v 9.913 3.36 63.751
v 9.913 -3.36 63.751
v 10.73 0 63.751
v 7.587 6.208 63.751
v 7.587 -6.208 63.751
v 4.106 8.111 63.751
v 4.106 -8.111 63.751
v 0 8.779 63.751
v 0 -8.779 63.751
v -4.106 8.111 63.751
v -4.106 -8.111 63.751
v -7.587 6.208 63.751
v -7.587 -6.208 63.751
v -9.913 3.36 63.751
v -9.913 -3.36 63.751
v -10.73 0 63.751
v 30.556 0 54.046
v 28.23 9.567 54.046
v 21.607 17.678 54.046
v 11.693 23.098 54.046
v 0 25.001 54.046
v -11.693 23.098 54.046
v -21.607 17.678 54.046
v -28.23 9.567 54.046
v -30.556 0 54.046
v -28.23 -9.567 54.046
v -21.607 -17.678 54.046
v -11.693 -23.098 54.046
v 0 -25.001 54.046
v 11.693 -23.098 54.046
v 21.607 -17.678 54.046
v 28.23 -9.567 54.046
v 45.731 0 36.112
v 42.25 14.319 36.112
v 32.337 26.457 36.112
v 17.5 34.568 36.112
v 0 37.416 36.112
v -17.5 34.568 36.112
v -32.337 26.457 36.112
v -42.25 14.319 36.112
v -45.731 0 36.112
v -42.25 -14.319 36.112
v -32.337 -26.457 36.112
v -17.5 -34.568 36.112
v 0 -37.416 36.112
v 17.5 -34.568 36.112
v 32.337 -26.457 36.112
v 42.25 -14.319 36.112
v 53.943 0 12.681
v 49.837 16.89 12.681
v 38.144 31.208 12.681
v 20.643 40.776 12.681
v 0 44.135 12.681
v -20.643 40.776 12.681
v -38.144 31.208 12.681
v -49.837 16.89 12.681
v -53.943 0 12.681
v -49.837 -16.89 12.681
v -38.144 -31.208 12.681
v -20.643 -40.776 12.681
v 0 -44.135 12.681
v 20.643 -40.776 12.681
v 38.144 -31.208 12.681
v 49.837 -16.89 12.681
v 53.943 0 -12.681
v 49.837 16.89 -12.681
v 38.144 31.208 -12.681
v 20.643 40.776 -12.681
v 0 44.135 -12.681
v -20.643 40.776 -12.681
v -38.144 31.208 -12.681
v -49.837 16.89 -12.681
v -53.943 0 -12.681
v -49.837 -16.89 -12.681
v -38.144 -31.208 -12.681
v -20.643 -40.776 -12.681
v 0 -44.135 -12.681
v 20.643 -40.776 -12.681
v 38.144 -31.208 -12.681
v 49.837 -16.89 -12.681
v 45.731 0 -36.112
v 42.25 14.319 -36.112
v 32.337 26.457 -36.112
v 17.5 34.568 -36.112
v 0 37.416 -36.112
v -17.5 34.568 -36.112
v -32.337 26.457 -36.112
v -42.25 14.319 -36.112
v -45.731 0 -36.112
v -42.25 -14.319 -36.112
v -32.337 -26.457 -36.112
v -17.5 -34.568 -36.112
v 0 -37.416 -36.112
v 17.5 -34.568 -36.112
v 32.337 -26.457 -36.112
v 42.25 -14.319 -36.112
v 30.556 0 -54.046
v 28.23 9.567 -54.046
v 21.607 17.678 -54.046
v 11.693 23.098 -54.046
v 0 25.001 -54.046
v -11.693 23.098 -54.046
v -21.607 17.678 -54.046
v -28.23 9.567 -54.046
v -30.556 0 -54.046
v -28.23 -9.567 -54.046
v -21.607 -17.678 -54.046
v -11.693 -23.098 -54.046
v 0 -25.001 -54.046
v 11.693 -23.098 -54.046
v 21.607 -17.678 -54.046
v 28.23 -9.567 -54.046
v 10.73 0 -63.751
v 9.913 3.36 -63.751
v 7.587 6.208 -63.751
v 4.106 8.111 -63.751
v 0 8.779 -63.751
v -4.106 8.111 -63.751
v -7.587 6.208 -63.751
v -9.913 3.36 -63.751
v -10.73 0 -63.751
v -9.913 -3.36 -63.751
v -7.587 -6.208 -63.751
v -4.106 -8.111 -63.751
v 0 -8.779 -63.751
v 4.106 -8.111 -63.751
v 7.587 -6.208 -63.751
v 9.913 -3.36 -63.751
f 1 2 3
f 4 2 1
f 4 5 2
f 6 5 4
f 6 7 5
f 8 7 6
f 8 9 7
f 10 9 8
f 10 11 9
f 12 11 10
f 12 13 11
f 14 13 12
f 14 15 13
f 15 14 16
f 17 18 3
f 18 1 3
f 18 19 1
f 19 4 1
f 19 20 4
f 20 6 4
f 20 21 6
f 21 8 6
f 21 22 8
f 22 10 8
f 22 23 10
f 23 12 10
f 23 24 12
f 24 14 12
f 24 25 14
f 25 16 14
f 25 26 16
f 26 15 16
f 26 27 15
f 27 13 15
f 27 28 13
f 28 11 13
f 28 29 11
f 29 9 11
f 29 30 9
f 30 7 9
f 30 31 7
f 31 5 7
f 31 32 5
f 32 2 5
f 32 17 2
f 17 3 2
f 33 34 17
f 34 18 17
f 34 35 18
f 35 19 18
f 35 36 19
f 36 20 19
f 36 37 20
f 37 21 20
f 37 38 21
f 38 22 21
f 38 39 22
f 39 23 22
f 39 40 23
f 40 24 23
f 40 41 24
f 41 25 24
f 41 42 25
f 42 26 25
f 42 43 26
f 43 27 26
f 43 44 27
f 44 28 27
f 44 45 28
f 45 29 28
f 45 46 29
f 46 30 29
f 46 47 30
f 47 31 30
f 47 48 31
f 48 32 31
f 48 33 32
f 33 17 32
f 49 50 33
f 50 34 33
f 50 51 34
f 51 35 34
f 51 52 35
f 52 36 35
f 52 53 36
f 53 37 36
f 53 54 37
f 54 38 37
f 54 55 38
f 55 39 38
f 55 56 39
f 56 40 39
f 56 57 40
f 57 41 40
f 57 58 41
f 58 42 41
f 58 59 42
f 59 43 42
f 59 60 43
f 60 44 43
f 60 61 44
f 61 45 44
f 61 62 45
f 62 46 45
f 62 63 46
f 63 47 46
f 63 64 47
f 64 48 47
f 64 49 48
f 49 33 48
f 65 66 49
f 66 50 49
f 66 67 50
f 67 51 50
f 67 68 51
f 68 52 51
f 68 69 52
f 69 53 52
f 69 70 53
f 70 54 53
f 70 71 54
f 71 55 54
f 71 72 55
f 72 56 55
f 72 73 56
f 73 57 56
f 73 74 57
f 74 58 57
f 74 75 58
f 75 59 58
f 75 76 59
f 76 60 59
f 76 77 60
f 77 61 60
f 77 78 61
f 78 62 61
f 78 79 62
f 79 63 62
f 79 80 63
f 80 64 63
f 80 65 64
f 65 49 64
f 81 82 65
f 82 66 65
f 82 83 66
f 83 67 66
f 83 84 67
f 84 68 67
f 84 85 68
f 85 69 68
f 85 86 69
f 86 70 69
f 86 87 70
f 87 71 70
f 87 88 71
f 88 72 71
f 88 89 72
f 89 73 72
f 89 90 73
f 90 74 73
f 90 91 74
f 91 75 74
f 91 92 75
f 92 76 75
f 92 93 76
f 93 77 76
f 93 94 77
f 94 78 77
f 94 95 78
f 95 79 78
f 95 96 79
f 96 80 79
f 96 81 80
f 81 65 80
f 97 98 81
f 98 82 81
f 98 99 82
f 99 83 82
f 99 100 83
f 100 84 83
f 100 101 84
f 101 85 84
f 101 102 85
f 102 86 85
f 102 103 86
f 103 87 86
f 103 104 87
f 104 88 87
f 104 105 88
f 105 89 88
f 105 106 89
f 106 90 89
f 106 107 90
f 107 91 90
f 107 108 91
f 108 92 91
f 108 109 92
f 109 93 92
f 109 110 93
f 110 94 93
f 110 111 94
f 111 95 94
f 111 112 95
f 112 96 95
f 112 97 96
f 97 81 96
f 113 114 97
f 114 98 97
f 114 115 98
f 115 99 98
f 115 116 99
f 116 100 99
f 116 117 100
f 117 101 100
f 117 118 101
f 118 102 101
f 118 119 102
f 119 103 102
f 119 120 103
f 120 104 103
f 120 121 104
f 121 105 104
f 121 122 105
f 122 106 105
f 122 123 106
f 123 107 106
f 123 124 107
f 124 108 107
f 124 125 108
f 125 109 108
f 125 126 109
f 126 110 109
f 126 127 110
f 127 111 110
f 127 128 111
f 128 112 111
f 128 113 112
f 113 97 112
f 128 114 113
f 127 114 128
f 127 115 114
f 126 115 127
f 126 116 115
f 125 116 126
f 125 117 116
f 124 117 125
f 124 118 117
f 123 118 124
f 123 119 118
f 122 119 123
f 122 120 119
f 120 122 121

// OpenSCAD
// Generated by SolidPython 1.0.1 on 2020-07-29 00:46:49


scale(v = [11, 9, 13]) {
	sphere(r = 5);
}
/***********************************************
*********      SolidPython code:      **********
************************************************
 
# import packages: SolidPython
from solid import *
from solid.utils import *
from itertools import chain, combinations, permutations


class Resize:

    def __init__(self, scad_file):
        self.scad_file = scad_file
        #self.scad_file = import_scad(scad_file)
        # cone/cylinder param:
        self.r1 = 0
        self.r2 = 0
        self.h = 0
        # rectangular prism param:
        self.w = 0
        self.l = 0
        # ellipse param:
        self.r = 0

    # import OpenScad code (file name corresponds to shape)


    # classify shape + parameters
    def assign(self, param1, param2, param3):
        if self.scad_file == 'cone.scad':
            self.r1 = param1
            self.r2 = param2
            self.h = param3
        elif self.scad_file == 'cylinder.scad':
            self.r1 = param1
            self.r2 = param2
            self.h = param3
        elif self.scad_file == 'rectangularPrism.scad':
            self.h = param1
            self.l = param2
            self.w = param3
        else:
            self.r = param1
            self.h = param2

    # resize parameters
    def iterate(self):
        x = range(3, 20, 2)
        i = 1
        if self.scad_file == 'cone.scad':
            tempList = list(permutations(x, 2))
            for temp in tempList:
                param1 = temp[0]
                param2 = temp[1]
                filepath = 'produced_scad_files/' + 'cone' + str(param1) + '_' + str(param2) + '_' + '.scad'
                scad_render_to_file(cylinder(h=param1, r1=param2, r2=0), filepath)

        elif self.scad_file == 'cylinder.scad':
            tempList = list(permutations(x, 3))
            for temp in tempList:
                param1 = temp[0]
                param2 = temp[1]
                filepath = 'produced_scad_files/' + 'cylinder' + str(param1) + '_' + str(param2) + '_' + '.scad'
                scad_render_to_file(cylinder(h=param1, r1=param2, r2=param2), filepath)

        elif self.scad_file == 'rectangularPrism.scad':
            tempList = list(permutations(x, 3))
            for temp in tempList:
                param1 = temp[0]
                param2 = temp[1]
                param3 = temp[2]
                filepath = 'produced_scad_files/' + 'rectangularPrism' + str(param1) + '_' + str(param2) + '_' + str(
                    param3) + '.scad'
                scad_render_to_file(cube(size=(param1, param2, param3)), filepath)

        elif self.scad_file == 'ellipse.scad':
            tempList = list(permutations(x, 4))
            for temp in tempList:
                param1 = temp[0]
                param2 = temp[1]
                param3 = temp[2]
                param4 = temp[3]
                filepath = 'produced_scad_files/' + 'ellipse' + str(param1) + '_' + str(param2) + '_' + str(param3) + '_' + str(param4) + '.scad'
                scad_render_to_file(scale([param1, param2, param3])(sphere(r=param4)), filepath)

    def render_to_scadfile(self):
        scad_render_to_file(scad, 'example.scad') 
 
************************************************/
